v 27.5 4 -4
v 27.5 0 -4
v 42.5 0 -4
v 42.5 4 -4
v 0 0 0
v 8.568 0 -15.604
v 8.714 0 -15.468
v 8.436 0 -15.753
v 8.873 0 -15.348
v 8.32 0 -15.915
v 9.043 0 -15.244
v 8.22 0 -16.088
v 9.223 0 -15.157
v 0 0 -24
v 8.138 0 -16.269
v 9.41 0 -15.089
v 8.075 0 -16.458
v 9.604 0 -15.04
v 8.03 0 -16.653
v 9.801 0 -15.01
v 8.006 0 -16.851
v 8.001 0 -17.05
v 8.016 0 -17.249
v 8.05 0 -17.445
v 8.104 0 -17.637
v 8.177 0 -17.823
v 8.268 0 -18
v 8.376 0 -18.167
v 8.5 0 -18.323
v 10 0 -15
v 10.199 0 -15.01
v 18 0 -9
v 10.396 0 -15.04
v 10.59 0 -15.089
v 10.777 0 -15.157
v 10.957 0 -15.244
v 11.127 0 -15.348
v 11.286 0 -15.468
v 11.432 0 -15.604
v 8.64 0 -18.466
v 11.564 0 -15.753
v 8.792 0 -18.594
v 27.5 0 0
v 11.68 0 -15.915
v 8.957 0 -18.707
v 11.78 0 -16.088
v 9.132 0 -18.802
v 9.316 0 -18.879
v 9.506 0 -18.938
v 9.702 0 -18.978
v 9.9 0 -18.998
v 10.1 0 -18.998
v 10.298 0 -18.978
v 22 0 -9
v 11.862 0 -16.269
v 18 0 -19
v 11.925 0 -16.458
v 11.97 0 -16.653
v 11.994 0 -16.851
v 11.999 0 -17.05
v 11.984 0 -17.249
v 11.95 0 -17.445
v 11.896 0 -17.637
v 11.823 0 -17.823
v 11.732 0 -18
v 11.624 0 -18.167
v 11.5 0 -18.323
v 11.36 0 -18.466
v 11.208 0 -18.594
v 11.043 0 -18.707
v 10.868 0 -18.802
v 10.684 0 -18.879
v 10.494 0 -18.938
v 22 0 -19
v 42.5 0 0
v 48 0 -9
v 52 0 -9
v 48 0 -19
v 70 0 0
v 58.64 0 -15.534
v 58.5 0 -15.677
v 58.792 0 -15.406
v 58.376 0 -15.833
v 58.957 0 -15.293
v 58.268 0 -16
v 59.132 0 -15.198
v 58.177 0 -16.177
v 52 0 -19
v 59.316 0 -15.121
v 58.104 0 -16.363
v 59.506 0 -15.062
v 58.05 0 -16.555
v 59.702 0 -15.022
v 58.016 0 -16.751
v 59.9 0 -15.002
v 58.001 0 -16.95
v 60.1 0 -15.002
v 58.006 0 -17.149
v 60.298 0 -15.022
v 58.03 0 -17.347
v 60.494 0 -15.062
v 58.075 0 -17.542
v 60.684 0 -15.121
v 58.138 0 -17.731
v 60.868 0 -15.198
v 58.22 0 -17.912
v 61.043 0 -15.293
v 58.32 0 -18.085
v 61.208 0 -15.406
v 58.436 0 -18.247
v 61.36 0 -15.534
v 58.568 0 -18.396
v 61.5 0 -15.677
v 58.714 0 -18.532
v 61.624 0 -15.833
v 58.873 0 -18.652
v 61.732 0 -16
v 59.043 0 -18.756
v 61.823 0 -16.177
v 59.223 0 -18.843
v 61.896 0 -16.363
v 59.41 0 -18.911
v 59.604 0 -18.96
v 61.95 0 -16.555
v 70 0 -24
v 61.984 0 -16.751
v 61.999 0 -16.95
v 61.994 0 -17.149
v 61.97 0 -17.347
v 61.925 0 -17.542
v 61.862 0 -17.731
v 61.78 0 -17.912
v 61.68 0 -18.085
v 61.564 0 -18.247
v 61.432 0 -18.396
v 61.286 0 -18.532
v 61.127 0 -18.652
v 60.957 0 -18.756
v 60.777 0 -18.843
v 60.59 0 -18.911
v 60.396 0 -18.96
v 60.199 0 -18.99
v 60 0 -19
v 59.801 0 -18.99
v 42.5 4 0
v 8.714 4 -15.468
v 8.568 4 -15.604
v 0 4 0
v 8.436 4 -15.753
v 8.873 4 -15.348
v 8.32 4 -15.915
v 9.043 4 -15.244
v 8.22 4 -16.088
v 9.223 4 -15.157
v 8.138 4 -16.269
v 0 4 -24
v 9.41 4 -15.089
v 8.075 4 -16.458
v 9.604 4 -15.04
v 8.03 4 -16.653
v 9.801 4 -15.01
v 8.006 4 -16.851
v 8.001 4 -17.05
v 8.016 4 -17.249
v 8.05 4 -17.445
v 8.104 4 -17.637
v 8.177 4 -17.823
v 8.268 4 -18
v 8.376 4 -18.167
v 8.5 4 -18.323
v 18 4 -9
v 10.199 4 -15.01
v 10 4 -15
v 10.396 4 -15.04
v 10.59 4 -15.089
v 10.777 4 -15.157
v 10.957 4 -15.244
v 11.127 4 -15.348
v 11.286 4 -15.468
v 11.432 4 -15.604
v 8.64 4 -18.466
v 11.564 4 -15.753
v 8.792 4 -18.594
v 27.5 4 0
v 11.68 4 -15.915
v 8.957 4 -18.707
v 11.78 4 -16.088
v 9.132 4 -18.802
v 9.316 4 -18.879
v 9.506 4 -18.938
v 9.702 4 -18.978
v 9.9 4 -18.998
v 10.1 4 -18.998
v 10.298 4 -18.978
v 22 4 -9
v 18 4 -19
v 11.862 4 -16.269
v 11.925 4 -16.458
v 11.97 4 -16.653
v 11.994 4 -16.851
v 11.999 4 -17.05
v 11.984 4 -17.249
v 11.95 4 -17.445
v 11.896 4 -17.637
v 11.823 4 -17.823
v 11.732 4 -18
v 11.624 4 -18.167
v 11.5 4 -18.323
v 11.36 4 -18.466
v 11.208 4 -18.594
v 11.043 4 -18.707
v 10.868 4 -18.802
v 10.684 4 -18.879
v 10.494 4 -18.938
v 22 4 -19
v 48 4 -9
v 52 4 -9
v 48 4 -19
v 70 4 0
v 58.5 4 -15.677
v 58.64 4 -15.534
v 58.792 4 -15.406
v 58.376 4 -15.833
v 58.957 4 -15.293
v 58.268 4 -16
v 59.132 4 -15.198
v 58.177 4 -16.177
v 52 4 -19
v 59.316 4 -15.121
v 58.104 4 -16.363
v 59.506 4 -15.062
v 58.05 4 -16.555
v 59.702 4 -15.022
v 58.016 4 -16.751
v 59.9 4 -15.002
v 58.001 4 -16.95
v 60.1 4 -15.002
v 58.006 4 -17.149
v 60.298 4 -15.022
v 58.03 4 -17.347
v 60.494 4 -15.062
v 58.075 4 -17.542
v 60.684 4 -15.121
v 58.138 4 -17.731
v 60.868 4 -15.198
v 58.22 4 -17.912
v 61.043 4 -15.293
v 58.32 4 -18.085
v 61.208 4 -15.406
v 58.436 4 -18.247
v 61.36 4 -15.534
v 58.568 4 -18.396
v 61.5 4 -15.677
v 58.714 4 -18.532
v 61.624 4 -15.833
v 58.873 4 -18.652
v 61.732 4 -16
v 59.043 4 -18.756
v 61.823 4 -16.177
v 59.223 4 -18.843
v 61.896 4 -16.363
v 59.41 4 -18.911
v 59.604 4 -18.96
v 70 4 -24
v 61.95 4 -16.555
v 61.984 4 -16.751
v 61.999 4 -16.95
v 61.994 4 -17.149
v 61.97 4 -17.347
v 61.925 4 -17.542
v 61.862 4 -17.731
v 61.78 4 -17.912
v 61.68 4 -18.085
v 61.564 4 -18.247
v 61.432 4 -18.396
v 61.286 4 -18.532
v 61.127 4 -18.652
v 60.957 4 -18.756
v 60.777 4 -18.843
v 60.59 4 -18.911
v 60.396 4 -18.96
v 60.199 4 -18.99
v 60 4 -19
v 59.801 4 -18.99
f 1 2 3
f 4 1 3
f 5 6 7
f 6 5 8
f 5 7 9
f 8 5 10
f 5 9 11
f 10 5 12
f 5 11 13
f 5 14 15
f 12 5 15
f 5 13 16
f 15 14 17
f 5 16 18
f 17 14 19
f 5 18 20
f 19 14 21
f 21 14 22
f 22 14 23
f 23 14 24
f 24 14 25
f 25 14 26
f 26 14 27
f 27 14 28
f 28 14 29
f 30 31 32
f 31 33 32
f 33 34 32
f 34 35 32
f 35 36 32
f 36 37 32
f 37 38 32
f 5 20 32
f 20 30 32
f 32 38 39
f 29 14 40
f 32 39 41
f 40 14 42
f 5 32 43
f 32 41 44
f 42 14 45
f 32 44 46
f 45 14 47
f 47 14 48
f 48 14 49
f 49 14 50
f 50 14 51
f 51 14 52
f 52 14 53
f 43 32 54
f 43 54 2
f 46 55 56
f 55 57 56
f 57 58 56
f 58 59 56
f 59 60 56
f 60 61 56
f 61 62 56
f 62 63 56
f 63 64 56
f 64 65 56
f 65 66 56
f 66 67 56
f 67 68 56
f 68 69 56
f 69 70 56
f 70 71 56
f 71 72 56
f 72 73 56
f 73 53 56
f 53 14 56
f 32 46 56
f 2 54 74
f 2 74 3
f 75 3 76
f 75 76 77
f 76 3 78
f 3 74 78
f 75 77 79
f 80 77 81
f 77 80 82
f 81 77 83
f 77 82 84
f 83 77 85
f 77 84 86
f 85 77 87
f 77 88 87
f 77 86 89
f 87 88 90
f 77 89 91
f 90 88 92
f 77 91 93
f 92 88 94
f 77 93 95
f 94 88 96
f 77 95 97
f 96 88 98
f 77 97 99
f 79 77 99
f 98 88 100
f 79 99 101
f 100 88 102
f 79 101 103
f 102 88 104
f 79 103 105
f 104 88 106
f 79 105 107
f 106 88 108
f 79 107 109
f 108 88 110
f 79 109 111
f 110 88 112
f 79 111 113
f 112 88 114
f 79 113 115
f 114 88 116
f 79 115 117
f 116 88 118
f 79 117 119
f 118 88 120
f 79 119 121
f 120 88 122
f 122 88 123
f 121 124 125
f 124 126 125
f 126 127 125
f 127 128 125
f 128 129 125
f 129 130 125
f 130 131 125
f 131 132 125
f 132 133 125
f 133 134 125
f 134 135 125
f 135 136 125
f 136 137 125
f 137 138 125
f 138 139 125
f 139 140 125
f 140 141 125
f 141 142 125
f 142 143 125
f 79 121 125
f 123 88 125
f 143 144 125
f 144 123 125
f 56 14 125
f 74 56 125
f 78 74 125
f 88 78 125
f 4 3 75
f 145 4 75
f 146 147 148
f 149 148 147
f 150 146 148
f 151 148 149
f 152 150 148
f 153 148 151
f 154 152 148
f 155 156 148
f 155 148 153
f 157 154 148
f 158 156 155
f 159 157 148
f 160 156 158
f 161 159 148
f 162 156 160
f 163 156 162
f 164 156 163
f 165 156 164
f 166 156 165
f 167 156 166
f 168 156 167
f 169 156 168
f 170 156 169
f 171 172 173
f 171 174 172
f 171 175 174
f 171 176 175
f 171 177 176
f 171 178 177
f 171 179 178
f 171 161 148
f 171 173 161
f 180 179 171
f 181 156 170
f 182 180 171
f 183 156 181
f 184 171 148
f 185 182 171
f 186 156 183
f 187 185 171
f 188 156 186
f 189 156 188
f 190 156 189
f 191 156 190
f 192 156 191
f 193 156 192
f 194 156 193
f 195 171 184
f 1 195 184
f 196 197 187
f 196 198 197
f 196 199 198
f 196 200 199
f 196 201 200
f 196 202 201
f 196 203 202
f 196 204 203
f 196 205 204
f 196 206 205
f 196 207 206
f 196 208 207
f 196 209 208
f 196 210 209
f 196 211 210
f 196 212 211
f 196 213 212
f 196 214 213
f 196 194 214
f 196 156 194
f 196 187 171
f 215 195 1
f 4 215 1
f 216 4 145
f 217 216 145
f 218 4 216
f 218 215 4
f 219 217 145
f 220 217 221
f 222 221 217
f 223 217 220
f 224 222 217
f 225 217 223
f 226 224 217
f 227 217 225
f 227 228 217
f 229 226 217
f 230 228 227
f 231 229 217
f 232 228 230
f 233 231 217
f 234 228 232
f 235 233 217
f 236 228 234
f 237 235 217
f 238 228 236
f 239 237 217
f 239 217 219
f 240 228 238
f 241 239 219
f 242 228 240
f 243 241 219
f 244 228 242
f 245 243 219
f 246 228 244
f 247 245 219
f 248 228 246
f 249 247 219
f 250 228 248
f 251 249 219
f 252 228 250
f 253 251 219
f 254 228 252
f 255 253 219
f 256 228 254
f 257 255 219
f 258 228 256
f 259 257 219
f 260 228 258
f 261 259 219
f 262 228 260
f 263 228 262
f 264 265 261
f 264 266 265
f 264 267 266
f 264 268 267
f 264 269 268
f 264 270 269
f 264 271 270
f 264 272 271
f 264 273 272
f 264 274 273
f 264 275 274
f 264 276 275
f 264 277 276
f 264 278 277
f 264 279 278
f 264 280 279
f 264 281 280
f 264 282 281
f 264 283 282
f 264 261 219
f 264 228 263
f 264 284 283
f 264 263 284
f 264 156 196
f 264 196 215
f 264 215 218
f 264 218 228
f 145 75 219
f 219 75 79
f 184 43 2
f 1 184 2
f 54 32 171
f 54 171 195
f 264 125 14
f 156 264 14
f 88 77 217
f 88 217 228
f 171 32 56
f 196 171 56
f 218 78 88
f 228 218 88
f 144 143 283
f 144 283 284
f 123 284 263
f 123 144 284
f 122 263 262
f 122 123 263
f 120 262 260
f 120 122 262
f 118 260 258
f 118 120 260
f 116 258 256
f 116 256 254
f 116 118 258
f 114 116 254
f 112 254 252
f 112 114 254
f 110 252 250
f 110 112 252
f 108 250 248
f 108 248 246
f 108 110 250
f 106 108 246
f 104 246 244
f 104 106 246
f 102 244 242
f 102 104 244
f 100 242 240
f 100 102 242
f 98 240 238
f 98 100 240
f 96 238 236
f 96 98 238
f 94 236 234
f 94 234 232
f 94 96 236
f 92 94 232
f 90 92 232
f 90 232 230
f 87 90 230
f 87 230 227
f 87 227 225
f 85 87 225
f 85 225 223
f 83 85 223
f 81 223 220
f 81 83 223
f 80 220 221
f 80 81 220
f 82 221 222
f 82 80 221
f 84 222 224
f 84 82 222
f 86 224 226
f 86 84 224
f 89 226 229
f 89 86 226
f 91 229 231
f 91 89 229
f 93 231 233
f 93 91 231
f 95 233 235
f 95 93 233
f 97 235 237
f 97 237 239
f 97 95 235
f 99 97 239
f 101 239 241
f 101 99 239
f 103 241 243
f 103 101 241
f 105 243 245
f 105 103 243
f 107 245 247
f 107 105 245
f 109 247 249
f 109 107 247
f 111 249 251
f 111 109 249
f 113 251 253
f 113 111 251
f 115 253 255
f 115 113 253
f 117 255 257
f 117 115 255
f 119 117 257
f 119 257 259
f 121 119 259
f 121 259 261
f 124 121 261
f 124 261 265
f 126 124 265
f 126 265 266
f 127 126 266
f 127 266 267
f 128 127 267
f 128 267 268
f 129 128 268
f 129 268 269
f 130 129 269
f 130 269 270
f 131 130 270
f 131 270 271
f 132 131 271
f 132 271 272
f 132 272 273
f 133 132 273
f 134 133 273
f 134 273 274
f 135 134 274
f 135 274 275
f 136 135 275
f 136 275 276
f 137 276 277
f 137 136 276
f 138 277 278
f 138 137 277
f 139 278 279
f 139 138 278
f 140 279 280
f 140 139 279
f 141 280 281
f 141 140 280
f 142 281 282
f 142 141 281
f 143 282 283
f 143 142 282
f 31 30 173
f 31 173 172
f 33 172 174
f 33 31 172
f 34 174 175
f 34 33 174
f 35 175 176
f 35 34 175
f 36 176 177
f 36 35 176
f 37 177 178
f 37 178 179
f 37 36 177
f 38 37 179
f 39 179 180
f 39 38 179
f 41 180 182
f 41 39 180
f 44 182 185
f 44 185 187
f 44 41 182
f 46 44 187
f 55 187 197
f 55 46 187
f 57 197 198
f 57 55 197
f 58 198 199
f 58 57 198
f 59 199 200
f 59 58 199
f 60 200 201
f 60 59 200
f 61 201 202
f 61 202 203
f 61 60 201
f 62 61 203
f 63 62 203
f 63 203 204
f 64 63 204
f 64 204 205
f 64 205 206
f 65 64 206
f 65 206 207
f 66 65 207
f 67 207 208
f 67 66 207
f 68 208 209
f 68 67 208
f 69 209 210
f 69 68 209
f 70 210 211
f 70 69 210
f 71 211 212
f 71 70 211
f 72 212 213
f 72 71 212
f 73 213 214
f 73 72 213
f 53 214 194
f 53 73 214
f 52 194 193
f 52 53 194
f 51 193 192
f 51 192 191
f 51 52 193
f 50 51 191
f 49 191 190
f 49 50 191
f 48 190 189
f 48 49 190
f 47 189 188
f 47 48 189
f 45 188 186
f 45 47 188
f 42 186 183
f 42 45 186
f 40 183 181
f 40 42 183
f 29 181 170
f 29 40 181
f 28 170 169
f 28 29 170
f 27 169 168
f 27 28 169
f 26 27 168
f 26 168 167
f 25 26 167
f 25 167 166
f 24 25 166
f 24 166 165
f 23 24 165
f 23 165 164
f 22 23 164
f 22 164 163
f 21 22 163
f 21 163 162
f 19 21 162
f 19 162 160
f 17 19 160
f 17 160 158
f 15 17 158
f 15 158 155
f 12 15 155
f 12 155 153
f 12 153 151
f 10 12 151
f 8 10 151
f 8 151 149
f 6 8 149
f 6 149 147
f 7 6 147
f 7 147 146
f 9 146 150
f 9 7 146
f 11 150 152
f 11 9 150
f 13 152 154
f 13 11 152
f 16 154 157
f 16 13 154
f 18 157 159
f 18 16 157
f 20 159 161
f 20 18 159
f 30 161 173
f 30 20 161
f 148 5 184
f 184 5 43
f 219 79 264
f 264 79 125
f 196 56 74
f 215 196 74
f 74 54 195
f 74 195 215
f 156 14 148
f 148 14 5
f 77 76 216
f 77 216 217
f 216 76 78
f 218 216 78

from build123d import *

# Parameters (mm, degrees)
SKETCH1_R           = 2
SKETCH1_W           = 4
SKETCH1_H           = 10
BOSS_EXTRUDE1_DEPTH = 4


with BuildPart() as part:
    # Sketch1 → Boss-Extrude1 (new body)
    with BuildSketch(Plane(origin=(0, 0, 0), x_dir=(1, 0, 0), z_dir=(0, 1, 0))):
        Polygon((0, 0), (20, 0), (27.5, 0), (27.5, 4), (42.5, 4), (42.5, 0), (50, 0), (70, 0), (70, 24), (0, 24), align=None)
        with Locations(Location((10, 17, 0), (0, 0, 270))):
            Circle(SKETCH1_R, mode=Mode.SUBTRACT)
        with Locations(Location((60, 17, 0), (0, 0, 90))):
            Circle(SKETCH1_R, mode=Mode.SUBTRACT)
        with Locations((20, 14)):
            Rectangle(SKETCH1_W, SKETCH1_H, mode=Mode.SUBTRACT)
        with Locations((50, 14)):
            Rectangle(SKETCH1_W, SKETCH1_H, mode=Mode.SUBTRACT)
    extrude(amount=BOSS_EXTRUDE1_DEPTH)


solid = part.part
